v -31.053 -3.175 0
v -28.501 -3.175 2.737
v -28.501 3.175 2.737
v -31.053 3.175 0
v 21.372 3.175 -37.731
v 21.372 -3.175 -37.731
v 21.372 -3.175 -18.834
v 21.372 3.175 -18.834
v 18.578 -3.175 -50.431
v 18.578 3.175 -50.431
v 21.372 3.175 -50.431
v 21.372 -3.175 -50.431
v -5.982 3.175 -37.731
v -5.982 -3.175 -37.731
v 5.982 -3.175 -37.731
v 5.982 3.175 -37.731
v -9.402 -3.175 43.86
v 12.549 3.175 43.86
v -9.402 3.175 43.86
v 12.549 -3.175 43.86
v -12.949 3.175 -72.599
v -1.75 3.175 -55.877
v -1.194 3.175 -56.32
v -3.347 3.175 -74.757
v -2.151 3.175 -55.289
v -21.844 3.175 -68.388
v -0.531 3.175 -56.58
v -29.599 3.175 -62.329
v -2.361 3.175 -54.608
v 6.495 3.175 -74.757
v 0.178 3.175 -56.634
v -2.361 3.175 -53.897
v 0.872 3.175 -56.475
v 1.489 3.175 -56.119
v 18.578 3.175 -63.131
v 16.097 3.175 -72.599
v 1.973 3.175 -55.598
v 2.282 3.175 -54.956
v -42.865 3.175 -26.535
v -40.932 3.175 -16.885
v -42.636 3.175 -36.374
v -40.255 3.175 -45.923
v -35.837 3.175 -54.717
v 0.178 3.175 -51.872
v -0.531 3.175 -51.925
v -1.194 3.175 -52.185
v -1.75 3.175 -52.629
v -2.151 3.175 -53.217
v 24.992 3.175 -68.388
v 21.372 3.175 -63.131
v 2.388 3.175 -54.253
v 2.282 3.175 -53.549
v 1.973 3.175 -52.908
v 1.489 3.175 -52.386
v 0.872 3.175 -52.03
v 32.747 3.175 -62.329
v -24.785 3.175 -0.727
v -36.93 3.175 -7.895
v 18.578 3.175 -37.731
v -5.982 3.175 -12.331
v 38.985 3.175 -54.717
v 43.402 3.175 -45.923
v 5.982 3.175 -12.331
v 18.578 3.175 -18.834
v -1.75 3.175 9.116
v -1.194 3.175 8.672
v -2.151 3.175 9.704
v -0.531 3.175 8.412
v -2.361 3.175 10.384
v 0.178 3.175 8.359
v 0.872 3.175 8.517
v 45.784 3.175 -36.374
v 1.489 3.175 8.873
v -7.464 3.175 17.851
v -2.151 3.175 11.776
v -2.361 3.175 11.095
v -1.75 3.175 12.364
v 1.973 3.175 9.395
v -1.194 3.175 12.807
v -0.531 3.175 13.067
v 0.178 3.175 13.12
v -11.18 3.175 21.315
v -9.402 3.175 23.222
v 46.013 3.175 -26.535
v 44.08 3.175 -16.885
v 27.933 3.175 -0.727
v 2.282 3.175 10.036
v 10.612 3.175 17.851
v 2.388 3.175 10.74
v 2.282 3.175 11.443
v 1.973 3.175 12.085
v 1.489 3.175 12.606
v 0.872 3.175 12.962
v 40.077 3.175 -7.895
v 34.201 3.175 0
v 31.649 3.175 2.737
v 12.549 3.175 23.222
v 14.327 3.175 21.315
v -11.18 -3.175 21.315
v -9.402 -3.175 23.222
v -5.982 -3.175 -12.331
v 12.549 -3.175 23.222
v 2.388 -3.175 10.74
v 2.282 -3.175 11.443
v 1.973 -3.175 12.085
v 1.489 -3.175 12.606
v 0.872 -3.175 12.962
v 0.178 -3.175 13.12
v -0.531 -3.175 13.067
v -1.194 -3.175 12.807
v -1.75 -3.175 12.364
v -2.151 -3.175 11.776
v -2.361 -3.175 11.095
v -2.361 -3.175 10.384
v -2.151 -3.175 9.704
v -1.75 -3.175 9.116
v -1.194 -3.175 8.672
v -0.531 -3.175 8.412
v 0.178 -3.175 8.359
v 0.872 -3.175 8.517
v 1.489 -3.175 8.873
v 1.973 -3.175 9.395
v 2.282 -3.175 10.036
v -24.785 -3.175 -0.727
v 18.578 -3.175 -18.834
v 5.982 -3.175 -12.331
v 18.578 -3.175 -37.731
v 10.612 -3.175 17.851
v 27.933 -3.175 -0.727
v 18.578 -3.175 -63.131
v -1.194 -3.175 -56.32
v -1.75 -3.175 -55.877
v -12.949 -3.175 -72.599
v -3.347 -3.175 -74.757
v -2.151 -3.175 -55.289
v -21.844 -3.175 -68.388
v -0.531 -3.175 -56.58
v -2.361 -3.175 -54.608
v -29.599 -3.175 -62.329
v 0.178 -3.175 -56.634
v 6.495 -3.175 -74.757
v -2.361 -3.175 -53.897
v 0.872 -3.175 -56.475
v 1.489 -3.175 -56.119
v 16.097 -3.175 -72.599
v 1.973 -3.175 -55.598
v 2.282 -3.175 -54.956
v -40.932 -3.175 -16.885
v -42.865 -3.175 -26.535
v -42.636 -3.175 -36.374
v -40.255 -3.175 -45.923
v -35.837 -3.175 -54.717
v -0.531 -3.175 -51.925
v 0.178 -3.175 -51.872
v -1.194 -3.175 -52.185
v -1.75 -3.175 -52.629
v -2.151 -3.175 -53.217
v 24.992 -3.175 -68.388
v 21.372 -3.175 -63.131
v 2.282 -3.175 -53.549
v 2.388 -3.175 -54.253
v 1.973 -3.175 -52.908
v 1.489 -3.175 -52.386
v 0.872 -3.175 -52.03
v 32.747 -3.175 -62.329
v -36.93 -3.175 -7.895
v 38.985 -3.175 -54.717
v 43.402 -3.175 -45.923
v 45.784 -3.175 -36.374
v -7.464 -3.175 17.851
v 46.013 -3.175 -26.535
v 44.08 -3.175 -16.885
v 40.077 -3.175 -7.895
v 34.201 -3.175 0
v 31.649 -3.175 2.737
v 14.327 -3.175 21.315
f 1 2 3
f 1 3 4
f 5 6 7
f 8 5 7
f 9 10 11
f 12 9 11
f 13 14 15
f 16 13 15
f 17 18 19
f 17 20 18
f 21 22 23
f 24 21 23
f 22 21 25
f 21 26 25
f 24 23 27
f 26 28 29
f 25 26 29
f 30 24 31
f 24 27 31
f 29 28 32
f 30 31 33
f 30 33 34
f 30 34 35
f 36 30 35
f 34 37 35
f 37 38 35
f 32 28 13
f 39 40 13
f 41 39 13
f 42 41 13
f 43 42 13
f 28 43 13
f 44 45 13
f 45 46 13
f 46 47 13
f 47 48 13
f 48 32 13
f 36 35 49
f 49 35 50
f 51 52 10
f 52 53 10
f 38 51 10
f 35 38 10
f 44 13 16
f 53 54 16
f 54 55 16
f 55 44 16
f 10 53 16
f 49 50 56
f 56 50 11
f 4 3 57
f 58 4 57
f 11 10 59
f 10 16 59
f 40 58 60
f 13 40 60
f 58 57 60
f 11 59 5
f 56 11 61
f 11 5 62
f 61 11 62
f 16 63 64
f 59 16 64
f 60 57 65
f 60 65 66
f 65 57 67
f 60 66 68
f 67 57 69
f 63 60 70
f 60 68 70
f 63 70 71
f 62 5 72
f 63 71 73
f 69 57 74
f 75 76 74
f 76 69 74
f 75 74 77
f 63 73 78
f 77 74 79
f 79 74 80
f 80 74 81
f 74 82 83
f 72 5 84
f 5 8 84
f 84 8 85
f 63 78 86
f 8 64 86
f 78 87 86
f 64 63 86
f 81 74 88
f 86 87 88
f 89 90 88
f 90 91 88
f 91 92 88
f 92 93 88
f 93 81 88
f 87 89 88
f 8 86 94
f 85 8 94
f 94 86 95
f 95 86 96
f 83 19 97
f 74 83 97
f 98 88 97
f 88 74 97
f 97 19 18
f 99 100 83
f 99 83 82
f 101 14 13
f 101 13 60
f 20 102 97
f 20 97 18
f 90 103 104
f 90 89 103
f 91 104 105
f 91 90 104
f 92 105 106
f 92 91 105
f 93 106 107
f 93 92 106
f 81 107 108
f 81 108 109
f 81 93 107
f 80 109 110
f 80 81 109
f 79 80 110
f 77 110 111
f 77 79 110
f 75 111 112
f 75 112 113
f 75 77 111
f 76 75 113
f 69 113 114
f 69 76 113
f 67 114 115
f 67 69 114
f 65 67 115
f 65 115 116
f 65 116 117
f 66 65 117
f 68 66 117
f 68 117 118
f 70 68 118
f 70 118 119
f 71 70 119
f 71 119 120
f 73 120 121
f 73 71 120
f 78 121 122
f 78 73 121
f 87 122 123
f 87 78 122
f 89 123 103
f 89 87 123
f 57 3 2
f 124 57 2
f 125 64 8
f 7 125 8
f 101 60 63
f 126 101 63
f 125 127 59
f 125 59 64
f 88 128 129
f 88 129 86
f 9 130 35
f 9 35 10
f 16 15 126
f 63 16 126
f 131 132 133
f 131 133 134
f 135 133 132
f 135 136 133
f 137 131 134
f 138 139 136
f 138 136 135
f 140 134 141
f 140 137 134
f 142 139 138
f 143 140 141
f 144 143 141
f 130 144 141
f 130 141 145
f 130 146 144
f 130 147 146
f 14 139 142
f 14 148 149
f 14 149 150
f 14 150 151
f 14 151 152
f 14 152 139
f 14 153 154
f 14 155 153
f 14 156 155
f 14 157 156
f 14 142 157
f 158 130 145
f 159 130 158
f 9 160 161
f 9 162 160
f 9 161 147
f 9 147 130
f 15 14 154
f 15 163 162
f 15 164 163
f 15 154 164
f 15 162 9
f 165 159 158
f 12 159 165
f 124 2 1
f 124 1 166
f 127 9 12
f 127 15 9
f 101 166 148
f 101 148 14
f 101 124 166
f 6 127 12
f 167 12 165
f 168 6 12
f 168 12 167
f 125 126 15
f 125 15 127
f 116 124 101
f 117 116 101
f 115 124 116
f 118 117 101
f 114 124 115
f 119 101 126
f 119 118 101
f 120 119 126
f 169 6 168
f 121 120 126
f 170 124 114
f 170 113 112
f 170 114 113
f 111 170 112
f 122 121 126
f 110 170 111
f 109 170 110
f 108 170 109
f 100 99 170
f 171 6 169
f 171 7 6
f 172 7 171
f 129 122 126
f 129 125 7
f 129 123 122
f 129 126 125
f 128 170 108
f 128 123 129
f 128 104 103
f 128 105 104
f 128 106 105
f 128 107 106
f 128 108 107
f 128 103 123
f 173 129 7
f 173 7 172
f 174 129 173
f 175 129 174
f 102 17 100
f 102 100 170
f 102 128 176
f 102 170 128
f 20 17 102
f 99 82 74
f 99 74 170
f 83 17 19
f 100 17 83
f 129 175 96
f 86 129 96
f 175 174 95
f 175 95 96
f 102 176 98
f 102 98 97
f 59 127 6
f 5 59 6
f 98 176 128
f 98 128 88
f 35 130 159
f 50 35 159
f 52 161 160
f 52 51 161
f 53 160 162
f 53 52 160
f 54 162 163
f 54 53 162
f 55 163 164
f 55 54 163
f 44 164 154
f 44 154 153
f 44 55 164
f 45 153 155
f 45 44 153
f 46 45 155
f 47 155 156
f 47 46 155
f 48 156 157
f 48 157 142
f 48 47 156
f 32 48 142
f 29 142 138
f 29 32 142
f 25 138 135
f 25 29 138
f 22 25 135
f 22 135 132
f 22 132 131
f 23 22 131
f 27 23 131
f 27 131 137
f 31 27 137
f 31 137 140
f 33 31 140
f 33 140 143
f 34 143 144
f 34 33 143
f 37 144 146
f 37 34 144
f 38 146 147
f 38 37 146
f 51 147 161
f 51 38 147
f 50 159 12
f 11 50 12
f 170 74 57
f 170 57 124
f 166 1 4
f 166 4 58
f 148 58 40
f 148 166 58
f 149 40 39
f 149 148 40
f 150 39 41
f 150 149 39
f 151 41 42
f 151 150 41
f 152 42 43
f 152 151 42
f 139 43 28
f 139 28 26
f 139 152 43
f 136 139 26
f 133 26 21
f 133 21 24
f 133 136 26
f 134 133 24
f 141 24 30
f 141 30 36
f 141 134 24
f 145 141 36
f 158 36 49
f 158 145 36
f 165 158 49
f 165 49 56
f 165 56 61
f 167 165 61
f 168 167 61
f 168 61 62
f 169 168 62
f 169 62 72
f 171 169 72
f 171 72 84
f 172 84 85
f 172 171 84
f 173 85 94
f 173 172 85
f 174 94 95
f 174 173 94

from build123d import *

# Parameters (mm, degrees)
F0_R     = 2.3876
F0_W     = 11.9644477963
F0_H     = 25.4
F0_W_2   = 2.794
F0_H_2   = 12.7
F0_H_3   = 18.8976
F1_DEPTH = 3.175
F3_W     = 6.35
F3_H     = 25.4
F4_DEPTH = 5.08
F6_W     = 6.35
F6_H     = 25.4
F7_DEPTH = 5.08


with BuildPart() as f1:
    # F0 (on Front) → F1 (new body, symmetric)
    with BuildSketch(Plane.XZ):
        with BuildLine():
            Line((-9.4017383467, 23.2221963037), (-31.0533456504, 0))
            ThreePointArc((-31.0533456504, 0), (1.5738401562, -75.0292582617), (34.2010259628, 0))
            Line((34.2010259628, 0), (12.5494186591, 23.2221963037))
            Line((12.5494186591, 23.2221963037), (12.5494186591, 43.8596963037))
            Line((12.5494186591, 43.8596963037), (-9.4017383467, 43.8596963037))
            Line((-9.4017383467, 43.8596963037), (-9.4017383467, 23.2221963037))
        make_face()
        with Locations((0, -54.2525947094)):
            Circle(F0_R, mode=Mode.SUBTRACT)
        with Locations((0, -25.0313151628)):
            Rectangle(F0_W, F0_H, mode=Mode.SUBTRACT)
        with Locations((19.9750838982, -56.7813151628)):
            Rectangle(F0_W_2, F0_H_2, mode=Mode.SUBTRACT)
        with Locations((19.9750838982, -28.2825151628)):
            Rectangle(F0_W_2, F0_H_3, mode=Mode.SUBTRACT)
        with Locations((0, 10.739565827)):
            Circle(F0_R, mode=Mode.SUBTRACT)
    extrude(amount=F1_DEPTH, both=True)

    # F3 (on offset) → F4 (cut)
    with BuildSketch(Plane(origin=(-16.6122141895, 0, 15.4886787354), x_dir=(0, -1, 0), z_dir=(-0.7314077576, 0, 0.6819403875))):
        with Locations((0, -4.733831039)):
            Rectangle(F3_W, F3_H)
    extrude(amount=-F4_DEPTH, mode=Mode.SUBTRACT)

    # F6 (on offset) → F7 (cut)
    with BuildSketch(Plane(origin=(18.2960887755, 0, 17.0586676721), x_dir=(0, 1, 0), z_dir=(0.7314077576, 0, 0.6819403875))):
        with Locations((0, -6.8803708986)):
            Rectangle(F6_W, F6_H)
    extrude(amount=-F7_DEPTH, mode=Mode.SUBTRACT)


solid = f1.part
